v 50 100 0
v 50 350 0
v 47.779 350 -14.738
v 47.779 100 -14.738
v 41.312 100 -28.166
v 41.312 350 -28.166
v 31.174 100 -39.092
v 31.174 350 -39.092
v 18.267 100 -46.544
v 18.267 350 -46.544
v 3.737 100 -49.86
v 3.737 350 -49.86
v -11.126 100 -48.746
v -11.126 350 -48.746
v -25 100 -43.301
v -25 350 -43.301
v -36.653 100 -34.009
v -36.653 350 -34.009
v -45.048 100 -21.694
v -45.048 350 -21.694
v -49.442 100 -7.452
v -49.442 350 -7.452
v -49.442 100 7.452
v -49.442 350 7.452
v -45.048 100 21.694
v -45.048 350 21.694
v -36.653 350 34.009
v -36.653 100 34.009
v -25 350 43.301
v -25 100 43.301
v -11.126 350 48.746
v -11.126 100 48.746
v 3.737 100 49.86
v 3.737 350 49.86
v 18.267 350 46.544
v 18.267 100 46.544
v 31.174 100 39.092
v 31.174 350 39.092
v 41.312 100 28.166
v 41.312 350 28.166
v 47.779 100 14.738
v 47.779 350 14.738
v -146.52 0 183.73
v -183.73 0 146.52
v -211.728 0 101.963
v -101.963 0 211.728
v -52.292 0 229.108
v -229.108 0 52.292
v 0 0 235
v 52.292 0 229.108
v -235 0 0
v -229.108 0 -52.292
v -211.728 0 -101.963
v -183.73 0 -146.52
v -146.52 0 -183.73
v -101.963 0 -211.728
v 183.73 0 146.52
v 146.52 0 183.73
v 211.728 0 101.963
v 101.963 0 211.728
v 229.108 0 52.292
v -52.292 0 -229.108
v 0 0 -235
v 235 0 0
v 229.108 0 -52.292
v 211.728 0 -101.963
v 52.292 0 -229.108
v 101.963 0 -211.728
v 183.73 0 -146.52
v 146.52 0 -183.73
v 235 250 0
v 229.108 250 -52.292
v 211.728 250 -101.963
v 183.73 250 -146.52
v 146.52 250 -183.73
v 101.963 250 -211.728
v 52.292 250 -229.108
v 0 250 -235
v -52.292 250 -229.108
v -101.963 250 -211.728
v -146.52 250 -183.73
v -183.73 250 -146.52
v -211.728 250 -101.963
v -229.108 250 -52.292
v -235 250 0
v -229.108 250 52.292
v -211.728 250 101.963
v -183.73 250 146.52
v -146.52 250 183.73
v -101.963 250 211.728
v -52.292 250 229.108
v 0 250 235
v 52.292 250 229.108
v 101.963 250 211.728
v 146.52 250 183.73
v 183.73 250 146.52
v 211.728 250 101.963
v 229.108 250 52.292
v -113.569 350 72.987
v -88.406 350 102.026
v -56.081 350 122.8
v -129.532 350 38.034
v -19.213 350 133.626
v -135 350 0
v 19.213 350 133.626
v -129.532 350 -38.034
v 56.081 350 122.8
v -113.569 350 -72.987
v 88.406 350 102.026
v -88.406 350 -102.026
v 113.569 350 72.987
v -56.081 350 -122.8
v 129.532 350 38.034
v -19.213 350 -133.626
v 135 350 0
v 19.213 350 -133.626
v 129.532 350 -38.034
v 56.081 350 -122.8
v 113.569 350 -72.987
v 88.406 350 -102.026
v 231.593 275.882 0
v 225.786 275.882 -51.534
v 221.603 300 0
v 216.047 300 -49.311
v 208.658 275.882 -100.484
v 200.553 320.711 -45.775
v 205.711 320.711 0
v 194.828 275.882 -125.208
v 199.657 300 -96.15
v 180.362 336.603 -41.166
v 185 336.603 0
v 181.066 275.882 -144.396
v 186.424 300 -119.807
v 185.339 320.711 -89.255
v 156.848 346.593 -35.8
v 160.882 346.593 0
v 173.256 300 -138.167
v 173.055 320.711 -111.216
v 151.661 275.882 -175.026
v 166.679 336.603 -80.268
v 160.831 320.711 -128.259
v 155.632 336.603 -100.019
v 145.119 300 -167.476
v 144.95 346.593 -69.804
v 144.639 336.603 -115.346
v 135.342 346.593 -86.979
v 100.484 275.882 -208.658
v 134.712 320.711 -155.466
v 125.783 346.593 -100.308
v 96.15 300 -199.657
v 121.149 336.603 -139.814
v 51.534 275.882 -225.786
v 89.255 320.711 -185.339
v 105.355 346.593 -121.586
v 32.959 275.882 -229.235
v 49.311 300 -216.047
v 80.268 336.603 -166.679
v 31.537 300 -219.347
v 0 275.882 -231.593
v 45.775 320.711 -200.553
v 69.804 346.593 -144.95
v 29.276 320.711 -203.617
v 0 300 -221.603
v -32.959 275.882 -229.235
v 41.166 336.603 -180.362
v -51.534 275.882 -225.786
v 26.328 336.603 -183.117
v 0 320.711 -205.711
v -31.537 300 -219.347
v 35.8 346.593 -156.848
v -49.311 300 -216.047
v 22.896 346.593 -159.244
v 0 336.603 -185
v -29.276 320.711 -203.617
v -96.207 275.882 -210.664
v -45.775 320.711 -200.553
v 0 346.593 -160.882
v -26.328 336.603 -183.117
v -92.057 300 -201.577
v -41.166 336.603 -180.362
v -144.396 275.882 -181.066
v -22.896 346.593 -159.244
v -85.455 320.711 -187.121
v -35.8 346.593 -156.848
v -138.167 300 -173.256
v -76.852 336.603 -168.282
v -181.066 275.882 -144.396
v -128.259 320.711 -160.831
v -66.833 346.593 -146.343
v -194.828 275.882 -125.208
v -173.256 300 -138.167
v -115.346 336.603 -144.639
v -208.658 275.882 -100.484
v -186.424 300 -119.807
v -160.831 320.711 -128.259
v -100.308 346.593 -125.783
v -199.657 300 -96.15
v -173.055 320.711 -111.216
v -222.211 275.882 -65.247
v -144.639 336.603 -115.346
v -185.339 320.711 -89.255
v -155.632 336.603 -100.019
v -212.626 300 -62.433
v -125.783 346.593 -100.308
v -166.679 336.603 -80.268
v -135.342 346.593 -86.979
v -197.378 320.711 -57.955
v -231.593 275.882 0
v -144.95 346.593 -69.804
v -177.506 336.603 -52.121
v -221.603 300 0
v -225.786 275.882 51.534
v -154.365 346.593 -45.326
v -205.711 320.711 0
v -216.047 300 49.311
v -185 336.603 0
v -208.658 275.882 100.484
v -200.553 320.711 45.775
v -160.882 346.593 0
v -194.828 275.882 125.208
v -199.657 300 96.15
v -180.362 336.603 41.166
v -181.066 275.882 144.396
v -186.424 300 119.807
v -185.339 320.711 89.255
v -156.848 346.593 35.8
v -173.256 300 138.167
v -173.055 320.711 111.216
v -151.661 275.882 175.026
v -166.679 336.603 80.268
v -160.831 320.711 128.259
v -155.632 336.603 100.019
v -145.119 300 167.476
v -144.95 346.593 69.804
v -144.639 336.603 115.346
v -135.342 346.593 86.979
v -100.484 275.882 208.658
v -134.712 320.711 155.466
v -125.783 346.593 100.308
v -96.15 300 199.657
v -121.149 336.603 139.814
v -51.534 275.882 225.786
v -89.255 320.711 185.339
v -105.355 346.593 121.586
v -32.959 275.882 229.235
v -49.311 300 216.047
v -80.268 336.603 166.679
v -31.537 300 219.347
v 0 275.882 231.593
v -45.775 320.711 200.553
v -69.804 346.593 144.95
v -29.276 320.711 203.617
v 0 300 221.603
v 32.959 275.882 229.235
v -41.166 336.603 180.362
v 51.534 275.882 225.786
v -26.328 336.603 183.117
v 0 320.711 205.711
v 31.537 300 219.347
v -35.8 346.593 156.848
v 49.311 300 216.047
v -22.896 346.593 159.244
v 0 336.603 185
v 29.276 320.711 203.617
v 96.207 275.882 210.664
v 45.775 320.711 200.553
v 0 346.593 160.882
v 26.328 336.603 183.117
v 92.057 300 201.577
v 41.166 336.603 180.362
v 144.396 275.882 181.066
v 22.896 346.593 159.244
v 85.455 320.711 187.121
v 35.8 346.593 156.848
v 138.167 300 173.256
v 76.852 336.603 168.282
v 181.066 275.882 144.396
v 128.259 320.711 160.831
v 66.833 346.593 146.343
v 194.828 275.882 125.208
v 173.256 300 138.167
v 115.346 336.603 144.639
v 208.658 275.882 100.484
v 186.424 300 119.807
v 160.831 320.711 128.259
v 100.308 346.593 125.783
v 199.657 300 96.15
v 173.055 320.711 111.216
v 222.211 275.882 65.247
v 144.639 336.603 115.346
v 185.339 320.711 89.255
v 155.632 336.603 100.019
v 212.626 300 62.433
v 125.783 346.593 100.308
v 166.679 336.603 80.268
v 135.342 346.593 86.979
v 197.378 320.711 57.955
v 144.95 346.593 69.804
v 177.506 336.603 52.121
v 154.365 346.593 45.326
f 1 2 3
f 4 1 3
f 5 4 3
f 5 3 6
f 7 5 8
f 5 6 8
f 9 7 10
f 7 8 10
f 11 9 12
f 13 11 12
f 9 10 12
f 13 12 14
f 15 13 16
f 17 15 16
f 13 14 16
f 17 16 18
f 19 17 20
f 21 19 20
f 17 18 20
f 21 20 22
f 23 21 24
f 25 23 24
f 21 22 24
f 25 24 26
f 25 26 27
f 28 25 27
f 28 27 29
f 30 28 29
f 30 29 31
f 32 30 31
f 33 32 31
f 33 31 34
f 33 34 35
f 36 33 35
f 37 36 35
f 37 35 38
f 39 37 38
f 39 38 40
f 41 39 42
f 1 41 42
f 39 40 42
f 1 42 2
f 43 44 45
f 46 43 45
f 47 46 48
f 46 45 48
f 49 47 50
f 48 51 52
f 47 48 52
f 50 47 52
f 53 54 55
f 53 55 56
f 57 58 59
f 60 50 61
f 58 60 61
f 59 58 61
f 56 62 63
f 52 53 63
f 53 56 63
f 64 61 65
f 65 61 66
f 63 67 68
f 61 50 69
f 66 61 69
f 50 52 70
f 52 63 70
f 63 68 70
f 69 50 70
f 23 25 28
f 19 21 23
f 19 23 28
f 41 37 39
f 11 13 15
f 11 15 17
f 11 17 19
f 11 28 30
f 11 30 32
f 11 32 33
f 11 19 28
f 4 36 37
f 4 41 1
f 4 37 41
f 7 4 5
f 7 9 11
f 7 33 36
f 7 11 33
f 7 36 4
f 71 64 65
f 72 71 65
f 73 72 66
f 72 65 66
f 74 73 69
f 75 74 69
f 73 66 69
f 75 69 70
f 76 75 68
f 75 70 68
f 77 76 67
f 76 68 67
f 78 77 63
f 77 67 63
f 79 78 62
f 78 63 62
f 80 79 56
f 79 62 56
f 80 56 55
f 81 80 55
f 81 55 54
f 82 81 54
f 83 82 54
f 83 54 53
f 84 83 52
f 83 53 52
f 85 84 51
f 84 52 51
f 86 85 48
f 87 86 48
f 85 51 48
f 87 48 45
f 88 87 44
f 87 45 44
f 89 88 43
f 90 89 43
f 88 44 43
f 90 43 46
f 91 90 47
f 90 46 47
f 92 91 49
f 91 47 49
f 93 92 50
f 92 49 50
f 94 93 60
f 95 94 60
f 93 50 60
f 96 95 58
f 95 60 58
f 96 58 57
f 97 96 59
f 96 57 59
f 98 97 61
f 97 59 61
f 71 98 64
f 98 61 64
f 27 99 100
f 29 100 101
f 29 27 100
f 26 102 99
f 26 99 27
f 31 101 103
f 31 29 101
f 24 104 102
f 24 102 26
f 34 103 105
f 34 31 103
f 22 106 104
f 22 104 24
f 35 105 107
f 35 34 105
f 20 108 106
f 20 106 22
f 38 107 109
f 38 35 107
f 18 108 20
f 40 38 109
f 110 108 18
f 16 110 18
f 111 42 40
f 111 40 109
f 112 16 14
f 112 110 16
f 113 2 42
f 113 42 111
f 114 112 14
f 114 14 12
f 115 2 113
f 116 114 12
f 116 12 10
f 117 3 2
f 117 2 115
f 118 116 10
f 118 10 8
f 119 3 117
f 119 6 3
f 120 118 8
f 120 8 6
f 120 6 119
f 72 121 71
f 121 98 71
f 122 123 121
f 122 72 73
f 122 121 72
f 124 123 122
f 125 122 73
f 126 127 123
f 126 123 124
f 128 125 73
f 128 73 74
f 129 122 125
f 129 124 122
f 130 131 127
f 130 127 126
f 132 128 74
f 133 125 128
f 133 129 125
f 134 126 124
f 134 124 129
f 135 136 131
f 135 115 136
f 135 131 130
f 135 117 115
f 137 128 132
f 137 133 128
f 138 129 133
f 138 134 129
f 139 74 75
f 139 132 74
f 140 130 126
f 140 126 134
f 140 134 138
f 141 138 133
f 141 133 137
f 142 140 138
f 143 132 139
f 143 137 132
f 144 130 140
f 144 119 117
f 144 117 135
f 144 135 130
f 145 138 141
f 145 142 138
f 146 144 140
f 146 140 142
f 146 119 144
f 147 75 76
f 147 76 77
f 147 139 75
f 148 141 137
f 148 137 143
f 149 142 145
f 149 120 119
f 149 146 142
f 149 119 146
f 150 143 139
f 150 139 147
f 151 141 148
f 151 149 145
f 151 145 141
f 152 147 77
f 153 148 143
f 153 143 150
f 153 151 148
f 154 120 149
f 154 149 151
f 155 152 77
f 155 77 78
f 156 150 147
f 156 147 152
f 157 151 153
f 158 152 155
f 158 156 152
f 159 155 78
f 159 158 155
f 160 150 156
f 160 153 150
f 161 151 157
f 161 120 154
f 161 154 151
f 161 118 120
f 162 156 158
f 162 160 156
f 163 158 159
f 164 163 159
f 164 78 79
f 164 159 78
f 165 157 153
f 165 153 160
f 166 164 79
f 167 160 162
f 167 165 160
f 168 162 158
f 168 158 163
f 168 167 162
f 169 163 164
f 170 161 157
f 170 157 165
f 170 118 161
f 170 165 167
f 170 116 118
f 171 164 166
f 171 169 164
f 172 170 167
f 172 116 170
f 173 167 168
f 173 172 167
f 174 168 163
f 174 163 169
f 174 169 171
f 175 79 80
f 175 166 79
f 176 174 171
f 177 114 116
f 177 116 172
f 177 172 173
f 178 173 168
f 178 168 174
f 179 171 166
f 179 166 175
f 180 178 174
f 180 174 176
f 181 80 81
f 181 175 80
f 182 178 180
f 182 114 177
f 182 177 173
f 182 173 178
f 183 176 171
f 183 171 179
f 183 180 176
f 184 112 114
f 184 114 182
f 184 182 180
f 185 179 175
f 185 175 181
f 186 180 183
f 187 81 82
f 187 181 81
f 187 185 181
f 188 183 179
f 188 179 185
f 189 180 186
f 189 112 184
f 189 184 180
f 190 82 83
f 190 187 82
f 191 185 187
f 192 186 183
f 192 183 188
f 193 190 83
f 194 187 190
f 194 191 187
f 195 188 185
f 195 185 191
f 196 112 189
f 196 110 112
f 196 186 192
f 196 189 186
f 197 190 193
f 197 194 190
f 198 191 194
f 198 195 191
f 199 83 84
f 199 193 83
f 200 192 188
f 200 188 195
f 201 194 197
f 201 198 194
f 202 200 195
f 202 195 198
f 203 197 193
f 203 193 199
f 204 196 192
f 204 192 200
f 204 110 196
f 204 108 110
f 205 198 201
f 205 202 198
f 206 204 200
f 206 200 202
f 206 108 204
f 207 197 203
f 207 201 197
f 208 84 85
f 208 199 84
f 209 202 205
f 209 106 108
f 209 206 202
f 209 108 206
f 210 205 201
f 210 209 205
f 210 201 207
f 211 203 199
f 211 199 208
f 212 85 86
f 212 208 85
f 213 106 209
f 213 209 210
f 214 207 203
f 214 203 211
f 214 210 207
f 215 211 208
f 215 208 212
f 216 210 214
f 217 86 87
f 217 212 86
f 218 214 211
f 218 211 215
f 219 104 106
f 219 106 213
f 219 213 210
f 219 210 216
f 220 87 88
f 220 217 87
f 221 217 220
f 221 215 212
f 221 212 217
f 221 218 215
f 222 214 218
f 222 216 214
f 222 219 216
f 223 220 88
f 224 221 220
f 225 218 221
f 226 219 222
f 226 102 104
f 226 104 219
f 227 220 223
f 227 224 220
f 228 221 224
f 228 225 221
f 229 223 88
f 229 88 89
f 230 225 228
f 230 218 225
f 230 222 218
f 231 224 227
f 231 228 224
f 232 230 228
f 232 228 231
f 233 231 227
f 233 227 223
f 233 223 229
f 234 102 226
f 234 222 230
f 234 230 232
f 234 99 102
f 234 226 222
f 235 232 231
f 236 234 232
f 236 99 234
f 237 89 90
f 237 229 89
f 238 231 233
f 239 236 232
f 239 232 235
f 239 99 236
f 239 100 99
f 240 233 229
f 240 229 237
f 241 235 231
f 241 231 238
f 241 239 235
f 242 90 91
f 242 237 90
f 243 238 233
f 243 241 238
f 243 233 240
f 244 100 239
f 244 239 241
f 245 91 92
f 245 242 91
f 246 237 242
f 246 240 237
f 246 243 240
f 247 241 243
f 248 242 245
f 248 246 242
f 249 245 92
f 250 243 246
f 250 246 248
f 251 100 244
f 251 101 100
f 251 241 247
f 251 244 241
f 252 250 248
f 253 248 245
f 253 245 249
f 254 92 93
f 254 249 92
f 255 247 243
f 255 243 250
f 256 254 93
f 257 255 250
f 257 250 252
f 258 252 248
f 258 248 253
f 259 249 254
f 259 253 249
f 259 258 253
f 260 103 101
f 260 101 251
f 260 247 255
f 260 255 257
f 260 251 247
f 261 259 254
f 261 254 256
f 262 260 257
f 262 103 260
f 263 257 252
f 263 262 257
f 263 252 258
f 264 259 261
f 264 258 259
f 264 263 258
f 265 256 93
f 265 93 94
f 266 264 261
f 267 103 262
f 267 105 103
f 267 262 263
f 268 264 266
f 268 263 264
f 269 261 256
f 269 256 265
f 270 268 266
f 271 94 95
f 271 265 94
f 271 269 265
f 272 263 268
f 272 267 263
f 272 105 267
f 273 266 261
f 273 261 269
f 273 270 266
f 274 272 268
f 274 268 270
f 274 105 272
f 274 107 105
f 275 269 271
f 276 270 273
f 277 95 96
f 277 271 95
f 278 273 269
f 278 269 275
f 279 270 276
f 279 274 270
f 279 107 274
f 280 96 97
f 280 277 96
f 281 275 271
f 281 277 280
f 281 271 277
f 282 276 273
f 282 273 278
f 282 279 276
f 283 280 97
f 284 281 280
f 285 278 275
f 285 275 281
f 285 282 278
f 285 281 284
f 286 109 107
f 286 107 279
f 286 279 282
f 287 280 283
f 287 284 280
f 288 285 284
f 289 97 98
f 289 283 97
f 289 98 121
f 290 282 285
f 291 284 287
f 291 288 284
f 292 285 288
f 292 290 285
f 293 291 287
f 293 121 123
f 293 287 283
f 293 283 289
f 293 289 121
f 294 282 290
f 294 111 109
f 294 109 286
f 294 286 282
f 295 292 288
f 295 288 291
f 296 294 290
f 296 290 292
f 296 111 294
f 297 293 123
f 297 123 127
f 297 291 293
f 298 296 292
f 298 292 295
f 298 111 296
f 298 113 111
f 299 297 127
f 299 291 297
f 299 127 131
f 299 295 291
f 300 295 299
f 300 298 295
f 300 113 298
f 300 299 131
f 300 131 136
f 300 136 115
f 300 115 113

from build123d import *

# Parameters (mm, degrees)
SKETCH1_R           = 235
BOSS_EXTRUDE1_DEPTH = 350
SKETCH3_R           = 50
CUT_EXTRUDE1_DEPTH  = 250
FILLET1_R           = 100


with BuildPart() as part:
    # Sketch1 → Boss-Extrude1 (new body)
    with BuildSketch(Plane(origin=(0, 0, 0), x_dir=(1, 0, 0), z_dir=(0, 1, 0))):
        Circle(SKETCH1_R)
    extrude(amount=BOSS_EXTRUDE1_DEPTH)

    # Sketch3 → Cut-Extrude1 (cut)
    with BuildSketch(Plane(origin=(0, 350, 0), x_dir=(1, 0, 0), z_dir=(0, 1, 0))):
        Circle(SKETCH3_R)
    extrude(amount=-CUT_EXTRUDE1_DEPTH, mode=Mode.SUBTRACT)

    # Fillet1
    fillet1_edges = [part.edges().sort_by_distance(p)[0] for p in [
        (-235, 350, 0),
    ]]
    fillet(fillet1_edges, radius=FILLET1_R)


solid = part.part
